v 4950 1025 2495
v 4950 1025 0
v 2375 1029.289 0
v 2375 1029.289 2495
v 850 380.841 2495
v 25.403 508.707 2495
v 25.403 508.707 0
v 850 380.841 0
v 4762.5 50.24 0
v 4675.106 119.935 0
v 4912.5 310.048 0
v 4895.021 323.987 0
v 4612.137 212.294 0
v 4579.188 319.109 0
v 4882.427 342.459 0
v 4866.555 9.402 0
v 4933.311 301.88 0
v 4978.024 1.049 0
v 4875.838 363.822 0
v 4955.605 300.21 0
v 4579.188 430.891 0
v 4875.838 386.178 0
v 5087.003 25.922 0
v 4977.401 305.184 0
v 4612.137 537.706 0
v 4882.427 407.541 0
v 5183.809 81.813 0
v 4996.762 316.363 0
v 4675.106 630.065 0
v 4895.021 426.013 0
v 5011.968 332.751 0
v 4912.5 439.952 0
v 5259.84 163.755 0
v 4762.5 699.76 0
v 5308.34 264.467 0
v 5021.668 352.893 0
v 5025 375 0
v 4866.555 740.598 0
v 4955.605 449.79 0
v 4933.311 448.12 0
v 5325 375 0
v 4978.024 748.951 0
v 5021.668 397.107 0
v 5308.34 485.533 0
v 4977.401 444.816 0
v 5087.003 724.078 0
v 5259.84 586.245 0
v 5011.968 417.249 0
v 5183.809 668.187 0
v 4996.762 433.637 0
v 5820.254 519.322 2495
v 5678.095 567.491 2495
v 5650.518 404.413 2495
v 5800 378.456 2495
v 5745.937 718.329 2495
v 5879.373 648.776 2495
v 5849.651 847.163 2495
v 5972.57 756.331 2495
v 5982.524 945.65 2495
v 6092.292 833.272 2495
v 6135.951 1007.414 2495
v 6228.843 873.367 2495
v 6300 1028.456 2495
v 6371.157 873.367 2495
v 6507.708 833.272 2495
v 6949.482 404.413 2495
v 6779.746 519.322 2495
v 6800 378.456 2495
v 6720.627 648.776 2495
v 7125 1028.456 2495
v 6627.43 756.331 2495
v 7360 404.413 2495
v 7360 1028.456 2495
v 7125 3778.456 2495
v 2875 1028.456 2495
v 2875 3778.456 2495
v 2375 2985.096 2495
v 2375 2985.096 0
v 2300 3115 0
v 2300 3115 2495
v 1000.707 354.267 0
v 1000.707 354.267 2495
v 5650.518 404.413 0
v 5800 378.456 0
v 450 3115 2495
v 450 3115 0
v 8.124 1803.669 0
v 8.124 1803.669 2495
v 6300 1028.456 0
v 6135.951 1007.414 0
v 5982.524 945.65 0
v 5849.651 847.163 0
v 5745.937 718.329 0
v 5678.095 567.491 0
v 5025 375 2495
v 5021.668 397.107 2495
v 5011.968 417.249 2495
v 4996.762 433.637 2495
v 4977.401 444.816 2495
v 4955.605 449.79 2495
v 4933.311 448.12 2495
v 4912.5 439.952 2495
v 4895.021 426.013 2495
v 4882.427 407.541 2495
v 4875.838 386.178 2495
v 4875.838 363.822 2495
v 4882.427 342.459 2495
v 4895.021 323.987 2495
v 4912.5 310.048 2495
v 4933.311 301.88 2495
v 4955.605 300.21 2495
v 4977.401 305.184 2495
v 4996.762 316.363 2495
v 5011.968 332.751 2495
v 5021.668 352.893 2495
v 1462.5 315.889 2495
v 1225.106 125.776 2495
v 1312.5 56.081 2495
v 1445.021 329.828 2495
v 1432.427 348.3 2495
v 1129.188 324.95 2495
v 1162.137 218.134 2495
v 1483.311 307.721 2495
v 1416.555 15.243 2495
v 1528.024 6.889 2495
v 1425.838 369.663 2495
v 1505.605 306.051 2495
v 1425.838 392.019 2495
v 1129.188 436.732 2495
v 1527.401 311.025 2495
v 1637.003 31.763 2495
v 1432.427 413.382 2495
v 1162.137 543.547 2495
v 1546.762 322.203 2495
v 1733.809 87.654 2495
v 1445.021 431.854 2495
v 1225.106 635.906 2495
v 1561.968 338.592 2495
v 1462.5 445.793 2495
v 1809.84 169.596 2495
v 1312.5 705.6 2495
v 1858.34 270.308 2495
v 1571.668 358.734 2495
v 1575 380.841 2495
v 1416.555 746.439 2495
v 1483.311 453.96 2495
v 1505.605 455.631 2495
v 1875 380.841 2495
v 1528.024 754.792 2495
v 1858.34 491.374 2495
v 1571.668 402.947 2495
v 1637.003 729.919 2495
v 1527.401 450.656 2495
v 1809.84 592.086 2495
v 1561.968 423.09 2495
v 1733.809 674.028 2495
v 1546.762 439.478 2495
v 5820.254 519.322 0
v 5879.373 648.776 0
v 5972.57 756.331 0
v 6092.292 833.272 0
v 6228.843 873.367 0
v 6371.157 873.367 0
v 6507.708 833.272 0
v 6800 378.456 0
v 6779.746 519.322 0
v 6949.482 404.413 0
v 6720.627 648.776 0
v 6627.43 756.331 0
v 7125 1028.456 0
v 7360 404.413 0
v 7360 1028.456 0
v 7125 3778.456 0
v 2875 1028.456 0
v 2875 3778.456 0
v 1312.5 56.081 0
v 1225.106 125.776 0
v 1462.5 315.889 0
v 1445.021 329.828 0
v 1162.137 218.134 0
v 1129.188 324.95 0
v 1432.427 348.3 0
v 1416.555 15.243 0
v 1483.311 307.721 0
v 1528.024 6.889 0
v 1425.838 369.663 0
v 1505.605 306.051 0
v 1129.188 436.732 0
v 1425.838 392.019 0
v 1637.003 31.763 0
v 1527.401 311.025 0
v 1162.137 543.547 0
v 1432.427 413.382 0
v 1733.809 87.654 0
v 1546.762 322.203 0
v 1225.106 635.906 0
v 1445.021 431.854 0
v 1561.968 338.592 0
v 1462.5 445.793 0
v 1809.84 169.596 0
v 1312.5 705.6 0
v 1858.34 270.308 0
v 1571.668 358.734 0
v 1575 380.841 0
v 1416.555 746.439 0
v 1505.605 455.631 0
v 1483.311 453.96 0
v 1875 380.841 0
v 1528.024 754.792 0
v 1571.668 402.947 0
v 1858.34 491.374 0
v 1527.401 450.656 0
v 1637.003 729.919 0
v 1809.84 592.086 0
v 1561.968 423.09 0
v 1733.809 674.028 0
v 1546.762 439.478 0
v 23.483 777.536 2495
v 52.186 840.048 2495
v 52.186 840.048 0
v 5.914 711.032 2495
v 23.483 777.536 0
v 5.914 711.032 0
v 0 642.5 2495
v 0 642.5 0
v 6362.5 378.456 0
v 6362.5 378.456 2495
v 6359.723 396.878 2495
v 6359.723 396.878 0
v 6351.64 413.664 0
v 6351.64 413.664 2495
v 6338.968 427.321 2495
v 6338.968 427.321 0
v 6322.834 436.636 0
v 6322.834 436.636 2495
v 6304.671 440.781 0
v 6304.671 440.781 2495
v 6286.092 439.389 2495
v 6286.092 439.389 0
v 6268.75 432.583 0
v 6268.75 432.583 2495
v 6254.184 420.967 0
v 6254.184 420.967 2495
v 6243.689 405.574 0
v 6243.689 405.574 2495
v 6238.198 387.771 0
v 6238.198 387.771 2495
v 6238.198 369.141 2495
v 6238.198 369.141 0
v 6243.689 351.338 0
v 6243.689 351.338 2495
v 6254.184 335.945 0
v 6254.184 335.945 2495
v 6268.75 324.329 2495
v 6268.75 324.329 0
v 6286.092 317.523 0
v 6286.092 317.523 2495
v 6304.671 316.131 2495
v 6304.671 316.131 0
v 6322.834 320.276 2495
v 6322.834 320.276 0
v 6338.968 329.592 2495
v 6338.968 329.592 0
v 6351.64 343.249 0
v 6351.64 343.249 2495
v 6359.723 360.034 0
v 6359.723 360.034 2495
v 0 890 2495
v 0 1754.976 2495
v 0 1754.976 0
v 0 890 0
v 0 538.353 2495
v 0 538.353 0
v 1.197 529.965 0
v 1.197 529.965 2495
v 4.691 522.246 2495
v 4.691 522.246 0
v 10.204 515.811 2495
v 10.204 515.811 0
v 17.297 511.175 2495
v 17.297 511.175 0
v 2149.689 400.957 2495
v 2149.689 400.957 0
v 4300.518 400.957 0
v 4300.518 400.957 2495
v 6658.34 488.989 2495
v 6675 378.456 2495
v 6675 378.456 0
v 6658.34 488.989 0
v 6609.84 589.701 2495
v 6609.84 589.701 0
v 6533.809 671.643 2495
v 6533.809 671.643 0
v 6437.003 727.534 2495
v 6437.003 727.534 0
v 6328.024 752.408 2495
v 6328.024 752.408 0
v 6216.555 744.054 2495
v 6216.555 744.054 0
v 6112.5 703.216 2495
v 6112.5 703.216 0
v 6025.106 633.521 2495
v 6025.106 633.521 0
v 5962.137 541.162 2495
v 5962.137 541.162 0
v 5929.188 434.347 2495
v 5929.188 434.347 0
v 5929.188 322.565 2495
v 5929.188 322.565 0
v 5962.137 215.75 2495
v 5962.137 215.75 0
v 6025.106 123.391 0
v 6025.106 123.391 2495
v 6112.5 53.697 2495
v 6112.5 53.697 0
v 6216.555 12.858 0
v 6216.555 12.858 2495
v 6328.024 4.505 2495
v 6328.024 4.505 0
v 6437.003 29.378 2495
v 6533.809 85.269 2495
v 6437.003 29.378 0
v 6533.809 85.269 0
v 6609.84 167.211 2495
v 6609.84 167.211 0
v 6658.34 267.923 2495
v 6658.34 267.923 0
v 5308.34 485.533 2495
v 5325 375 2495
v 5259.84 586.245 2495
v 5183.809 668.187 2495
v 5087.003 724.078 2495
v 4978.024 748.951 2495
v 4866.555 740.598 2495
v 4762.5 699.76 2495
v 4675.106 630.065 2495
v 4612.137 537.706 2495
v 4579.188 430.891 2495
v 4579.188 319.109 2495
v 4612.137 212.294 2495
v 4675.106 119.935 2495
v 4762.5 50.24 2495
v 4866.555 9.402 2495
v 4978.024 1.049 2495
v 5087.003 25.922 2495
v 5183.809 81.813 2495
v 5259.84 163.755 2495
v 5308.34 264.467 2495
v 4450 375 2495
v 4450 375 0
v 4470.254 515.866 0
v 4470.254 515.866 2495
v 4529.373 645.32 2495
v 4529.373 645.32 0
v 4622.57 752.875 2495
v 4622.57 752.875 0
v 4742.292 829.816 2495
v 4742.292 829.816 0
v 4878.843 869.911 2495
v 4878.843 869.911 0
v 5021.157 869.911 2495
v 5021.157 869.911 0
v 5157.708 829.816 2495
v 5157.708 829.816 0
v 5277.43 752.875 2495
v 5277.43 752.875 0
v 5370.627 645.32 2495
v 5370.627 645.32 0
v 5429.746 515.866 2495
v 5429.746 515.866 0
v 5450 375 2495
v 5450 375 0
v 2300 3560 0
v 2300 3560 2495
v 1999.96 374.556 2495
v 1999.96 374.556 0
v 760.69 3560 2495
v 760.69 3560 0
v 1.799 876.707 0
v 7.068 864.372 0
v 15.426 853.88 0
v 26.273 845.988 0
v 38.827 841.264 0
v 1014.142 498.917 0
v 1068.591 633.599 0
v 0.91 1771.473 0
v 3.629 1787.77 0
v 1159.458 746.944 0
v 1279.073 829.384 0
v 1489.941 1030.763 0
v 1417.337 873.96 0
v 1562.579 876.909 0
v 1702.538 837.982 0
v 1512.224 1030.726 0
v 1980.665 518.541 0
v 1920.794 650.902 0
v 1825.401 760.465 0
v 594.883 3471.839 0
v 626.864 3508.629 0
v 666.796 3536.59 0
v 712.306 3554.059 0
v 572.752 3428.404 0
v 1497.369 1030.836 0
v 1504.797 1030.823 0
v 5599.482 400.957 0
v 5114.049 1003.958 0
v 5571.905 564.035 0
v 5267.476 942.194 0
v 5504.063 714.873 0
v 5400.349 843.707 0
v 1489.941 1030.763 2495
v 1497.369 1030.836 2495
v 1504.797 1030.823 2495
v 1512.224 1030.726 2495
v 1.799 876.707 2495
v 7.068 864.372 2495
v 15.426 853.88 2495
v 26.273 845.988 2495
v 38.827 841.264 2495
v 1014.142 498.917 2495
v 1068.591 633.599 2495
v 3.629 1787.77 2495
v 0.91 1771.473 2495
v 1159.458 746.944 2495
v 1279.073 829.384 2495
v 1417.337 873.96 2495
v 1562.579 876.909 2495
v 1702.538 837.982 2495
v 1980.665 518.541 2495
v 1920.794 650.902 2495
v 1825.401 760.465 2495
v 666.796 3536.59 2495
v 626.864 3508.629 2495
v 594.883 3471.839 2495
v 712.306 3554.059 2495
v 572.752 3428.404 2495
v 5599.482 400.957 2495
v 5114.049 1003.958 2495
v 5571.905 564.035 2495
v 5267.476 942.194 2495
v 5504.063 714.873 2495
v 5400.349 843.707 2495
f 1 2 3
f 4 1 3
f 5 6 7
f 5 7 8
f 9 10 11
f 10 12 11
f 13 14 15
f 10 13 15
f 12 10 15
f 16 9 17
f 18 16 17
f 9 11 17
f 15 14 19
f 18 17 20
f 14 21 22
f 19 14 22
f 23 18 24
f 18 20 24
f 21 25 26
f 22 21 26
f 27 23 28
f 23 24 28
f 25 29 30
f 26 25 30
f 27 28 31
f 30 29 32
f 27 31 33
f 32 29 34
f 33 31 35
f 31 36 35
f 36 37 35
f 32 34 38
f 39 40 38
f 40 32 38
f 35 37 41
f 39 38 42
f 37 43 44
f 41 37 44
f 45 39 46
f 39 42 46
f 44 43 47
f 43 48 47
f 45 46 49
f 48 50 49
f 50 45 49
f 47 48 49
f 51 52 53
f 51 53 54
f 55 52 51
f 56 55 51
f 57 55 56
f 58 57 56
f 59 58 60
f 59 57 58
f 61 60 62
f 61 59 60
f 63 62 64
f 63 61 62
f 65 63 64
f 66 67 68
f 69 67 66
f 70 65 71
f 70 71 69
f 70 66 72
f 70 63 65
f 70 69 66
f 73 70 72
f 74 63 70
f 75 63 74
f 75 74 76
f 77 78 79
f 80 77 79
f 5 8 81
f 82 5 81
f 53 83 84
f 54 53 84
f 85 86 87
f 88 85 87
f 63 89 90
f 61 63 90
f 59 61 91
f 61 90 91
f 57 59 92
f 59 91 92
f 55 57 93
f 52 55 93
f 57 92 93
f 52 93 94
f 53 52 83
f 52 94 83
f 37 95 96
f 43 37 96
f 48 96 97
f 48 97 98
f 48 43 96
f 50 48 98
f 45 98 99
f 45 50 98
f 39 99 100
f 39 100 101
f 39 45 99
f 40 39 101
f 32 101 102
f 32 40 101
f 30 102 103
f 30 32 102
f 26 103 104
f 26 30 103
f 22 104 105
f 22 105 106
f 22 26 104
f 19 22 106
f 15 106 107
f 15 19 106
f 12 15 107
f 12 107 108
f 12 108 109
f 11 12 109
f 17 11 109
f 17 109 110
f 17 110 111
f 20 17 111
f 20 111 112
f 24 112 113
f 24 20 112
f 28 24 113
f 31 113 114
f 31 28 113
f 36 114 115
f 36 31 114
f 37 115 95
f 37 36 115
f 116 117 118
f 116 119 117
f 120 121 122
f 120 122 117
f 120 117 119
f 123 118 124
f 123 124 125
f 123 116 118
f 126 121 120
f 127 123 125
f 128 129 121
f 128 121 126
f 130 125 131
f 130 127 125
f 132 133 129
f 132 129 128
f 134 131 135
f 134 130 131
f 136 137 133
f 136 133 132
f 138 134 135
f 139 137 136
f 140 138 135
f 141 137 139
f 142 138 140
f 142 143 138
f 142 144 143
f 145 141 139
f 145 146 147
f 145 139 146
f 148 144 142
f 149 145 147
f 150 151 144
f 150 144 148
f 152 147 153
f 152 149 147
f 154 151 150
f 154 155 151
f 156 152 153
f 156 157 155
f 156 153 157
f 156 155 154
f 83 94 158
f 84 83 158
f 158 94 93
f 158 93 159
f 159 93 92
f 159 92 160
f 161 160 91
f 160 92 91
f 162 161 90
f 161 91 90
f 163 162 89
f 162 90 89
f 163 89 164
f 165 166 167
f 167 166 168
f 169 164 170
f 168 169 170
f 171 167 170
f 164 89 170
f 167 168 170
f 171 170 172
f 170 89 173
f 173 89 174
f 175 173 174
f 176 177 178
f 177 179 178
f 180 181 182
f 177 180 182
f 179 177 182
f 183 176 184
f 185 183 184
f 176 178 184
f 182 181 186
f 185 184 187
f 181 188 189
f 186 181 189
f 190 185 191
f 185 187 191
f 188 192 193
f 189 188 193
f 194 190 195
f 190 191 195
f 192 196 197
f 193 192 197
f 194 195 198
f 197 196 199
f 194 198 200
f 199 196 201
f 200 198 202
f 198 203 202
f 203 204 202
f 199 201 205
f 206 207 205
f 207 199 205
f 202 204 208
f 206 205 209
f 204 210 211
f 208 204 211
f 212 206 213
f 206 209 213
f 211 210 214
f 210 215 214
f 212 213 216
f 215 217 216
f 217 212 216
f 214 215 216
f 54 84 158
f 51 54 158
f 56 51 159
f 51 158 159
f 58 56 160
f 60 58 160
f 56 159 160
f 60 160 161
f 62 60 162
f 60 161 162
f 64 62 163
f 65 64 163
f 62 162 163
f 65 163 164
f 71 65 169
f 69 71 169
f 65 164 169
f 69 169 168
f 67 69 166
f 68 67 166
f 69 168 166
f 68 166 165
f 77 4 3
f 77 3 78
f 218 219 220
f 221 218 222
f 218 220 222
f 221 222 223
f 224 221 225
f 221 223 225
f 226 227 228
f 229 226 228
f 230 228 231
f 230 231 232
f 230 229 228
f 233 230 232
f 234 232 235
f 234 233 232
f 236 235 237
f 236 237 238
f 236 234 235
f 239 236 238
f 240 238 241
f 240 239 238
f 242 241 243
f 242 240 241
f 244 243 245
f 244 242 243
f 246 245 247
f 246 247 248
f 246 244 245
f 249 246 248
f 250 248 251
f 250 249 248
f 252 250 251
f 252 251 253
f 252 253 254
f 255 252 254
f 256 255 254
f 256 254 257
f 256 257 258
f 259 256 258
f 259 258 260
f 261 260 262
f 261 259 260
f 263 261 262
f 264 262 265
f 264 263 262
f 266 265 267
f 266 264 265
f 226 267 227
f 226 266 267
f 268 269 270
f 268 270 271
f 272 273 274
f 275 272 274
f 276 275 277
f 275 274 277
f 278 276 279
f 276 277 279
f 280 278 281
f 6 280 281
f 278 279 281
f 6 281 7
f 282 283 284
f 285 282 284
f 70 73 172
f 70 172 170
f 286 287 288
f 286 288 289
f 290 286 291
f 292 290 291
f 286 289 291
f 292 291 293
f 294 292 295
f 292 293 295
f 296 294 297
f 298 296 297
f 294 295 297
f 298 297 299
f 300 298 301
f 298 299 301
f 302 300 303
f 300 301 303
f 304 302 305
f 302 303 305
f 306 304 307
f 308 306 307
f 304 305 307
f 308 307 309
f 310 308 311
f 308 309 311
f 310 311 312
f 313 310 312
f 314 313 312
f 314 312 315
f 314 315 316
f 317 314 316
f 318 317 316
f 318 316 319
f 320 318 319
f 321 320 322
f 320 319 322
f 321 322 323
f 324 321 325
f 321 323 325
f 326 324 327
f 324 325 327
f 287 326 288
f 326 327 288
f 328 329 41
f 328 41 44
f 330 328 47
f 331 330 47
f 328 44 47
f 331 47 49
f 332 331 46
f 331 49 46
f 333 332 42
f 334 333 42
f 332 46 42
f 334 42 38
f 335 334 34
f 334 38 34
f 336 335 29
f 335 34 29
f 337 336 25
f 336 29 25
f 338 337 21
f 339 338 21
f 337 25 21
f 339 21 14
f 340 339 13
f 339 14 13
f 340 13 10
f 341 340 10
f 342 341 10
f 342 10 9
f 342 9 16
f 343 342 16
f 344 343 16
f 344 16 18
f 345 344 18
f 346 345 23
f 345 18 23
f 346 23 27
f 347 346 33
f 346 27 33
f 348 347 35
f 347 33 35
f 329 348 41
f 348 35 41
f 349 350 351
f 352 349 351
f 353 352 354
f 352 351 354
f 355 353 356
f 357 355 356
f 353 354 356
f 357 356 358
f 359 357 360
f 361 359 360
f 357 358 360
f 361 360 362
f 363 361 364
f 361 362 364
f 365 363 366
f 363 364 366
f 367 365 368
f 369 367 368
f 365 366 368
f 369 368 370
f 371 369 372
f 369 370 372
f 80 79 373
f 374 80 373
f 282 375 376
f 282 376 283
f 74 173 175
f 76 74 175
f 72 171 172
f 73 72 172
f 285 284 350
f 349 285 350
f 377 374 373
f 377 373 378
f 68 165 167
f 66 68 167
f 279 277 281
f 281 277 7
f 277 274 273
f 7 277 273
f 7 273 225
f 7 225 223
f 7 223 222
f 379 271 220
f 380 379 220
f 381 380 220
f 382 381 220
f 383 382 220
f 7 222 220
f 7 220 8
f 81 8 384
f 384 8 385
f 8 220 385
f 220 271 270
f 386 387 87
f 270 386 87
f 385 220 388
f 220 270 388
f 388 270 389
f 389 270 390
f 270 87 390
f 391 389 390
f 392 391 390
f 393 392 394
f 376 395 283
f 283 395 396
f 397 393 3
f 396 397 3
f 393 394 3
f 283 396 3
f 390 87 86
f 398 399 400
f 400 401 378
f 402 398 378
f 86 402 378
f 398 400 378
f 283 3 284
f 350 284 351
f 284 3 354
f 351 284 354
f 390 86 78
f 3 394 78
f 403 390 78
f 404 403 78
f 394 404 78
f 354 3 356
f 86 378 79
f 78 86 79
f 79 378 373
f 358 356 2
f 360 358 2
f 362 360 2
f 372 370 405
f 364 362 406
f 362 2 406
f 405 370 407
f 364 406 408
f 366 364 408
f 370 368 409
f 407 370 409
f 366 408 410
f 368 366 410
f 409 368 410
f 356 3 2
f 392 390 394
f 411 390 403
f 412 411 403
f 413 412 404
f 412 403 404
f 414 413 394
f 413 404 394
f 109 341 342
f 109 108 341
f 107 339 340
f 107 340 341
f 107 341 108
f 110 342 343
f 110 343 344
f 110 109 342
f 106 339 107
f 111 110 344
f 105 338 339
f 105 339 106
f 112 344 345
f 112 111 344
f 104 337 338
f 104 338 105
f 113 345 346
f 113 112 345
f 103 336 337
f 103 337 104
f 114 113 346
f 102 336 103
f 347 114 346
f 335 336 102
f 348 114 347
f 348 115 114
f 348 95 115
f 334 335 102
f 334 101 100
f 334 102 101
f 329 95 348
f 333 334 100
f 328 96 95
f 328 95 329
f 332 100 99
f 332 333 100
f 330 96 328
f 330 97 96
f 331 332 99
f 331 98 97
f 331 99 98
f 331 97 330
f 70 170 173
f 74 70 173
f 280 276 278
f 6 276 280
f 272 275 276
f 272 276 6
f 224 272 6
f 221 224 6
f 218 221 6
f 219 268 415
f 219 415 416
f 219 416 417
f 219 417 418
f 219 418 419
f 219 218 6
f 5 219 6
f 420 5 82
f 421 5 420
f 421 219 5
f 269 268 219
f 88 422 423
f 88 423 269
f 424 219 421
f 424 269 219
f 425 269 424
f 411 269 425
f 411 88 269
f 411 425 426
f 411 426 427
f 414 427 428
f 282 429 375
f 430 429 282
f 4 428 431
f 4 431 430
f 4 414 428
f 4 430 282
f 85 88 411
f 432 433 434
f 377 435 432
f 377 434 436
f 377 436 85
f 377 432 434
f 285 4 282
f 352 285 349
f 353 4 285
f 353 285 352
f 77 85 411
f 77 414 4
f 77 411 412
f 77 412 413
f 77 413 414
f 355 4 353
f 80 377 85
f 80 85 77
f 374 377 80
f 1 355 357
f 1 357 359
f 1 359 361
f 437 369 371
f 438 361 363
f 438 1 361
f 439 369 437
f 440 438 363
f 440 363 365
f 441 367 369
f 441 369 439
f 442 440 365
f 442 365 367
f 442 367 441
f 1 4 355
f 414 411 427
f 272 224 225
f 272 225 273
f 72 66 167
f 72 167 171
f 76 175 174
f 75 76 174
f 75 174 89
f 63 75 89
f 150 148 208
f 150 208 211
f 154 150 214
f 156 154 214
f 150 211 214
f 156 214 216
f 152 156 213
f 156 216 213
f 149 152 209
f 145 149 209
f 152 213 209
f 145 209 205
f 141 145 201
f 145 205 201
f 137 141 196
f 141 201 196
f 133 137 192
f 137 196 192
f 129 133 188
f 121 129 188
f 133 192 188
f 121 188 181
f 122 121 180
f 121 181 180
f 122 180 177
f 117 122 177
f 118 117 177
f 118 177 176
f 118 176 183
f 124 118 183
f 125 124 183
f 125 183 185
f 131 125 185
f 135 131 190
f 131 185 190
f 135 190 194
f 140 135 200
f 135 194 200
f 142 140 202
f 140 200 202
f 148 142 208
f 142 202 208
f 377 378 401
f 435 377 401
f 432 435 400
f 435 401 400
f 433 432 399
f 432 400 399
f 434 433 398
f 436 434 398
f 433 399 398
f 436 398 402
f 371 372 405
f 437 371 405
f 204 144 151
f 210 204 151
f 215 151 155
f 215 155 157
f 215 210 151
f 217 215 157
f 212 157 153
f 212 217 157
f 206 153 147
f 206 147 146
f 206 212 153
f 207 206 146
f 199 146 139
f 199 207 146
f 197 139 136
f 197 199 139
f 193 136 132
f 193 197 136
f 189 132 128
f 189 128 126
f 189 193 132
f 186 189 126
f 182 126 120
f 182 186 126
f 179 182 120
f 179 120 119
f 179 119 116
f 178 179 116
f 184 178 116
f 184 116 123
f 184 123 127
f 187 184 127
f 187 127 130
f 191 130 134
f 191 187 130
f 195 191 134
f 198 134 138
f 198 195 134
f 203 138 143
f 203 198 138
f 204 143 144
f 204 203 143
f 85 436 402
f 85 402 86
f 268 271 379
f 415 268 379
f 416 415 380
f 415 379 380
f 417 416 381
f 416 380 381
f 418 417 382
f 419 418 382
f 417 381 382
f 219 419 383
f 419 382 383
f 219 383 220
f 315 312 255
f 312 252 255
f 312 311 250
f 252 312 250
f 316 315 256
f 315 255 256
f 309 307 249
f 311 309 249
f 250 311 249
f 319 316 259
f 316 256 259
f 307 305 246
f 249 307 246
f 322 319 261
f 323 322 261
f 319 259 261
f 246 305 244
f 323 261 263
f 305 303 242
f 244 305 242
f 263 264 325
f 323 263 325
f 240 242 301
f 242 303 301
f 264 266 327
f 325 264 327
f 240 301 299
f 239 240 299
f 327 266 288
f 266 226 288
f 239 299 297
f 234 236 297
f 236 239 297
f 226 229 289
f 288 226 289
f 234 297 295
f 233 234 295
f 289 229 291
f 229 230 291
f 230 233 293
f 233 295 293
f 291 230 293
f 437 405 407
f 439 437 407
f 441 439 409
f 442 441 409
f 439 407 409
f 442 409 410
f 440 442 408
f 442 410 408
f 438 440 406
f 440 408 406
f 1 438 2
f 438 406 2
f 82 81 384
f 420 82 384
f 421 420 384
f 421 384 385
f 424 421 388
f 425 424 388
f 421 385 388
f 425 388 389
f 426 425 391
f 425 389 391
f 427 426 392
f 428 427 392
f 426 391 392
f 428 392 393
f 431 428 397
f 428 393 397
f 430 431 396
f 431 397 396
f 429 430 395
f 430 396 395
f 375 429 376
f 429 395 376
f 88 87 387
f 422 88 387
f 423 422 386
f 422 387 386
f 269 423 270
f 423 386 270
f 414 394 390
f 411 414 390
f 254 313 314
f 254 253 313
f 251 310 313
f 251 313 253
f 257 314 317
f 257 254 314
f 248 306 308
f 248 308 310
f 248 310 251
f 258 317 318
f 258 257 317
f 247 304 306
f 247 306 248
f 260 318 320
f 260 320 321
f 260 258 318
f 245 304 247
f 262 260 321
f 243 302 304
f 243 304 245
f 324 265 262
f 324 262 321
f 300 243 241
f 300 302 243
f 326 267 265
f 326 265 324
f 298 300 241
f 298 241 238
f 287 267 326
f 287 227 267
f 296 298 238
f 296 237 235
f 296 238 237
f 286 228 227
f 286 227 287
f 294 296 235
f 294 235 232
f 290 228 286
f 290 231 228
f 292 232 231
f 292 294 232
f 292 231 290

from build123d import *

# Parameters (mm, degrees)
BOSS_EXTRUDE1_DEPTH   = 2495
BOSS_EXTRUDE1_2_DEPTH = 2495
SKETCH1_R             = 375
SKETCH1_R_2           = 75
BOSS_EXTRUDE1_3_DEPTH = 2495
BOSS_EXTRUDE1_4_DEPTH = 2495
SKETCH1_R_3           = 62.5
BOSS_EXTRUDE1_5_DEPTH = 2495


with BuildPart() as part:
    # Sketch1 → Boss-Extrude1 (new body)
    with BuildSketch(Plane.XY):
        with BuildLine():
            Line((2875, 1028.456085172), (2375, 1029.28887678))
            Line((2375, 1029.28887678), (2375, 2985.096189432))
            Line((2375, 2985.096189432), (2300, 3115))
            Line((2300, 3115), (2300, 3560))
            Line((2300, 3560), (760.690046026, 3560))
            ThreePointArc((760.690046026, 3560), (645.974758755, 3523.830408858), (572.751521868, 3428.404028665))
            Line((572.751521868, 3428.404028665), (450, 3115))
            Line((450, 3115), (8.123515112, 1803.669160936))
            ThreePointArc((8.123515112, 1803.669160936), (2.044816358, 1779.658864628), (0, 1754.975598365))
            Line((0, 1754.975598365), (0, 890))
            ThreePointArc((0, 890), (15.425994412, 853.880225117), (52.185525503, 840.047788054))
            ThreePointArc((52.185525503, 840.047788054), (13.266377335, 744.66224526), (0, 642.500094242))
            Line((0, 642.500094242), (0, 538.353176878))
            ThreePointArc((0, 538.353176878), (7.219407149, 518.832813424), (25.402972623, 508.707480069))
            Line((25.402972623, 508.707480069), (850, 380.84085801))
            Line((850, 380.84085801), (1000.706658241, 354.26720799))
            ThreePointArc((1000.706658241, 354.26720799), (1489.850237153, 880.73782971), (1999.960496077, 374.555767537))
            Line((1999.960496077, 374.555767537), (2149.688652822, 400.956881343))
            Line((2149.688652822, 400.956881343), (4300.518483472, 400.956881343))
            Line((4300.518483472, 400.956881343), (4450, 375))
            ThreePointArc((4450, 375), (4950, 875), (5450, 375))
            Line((5450, 375), (5599.481516528, 400.956881343))
            ThreePointArc((5599.481516528, 400.956881343), (5400.348768804, 843.706716867), (4950, 1025))
            Line((4950, 1025), (2875, 1028.456085172))
        make_face()
        with BuildLine():
            Line((1512.224153378, 1030.725901748), (1489.940783681, 1030.763016555))
            ThreePointArc((1489.940783681, 1030.763016555), (1501.082627588, 1030.839956408), (1512.224153378, 1030.725901748))
        make_face(mode=Mode.SUBTRACT)
    extrude(amount=BOSS_EXTRUDE1_DEPTH)


with BuildPart() as body_2:
    # Sketch1 → Boss-Extrude1 2 (new body)
    with BuildSketch(Plane.XY):
        with BuildLine():
            Line((2875, 3778.456085172), (2875, 1028.456085172))
            Line((2875, 1028.456085172), (6300, 1028.456085172))
            ThreePointArc((6300, 1028.456085172), (5849.651231196, 847.162802039), (5650.518483472, 404.412966515))
            Line((5650.518483472, 404.412966515), (5800, 378.456085172))
            ThreePointArc((5800, 378.456085172), (6300, 878.456085172), (6800, 378.456085172))
            Line((6800, 378.456085172), (6949.481516528, 404.412966515))
            Line((6949.481516528, 404.412966515), (7360, 404.412966515))
            Line((7360, 404.412966515), (7360, 1028.456085172))
            Line((7360, 1028.456085172), (7125, 1028.456085172))
            Line((7125, 1028.456085172), (7125, 3778.456085172))
            Line((7125, 3778.456085172), (2875, 3778.456085172))
        make_face()
    extrude(amount=BOSS_EXTRUDE1_2_DEPTH)


with BuildPart() as body_3:
    # Sketch1 → Boss-Extrude1 3 (new body)
    with BuildSketch(Plane.XY):
        with Locations((1500, 380.84085801)):
            Circle(SKETCH1_R)
        with Locations((1500, 380.84085801)):
            Circle(SKETCH1_R_2, mode=Mode.SUBTRACT)
    extrude(amount=BOSS_EXTRUDE1_3_DEPTH)


with BuildPart() as body_4:
    # Sketch1 → Boss-Extrude1 4 (new body)
    with BuildSketch(Plane.XY):
        with Locations((4950, 375)):
            Circle(SKETCH1_R)
        with Locations((4950, 375)):
            Circle(SKETCH1_R_2, mode=Mode.SUBTRACT)
    extrude(amount=BOSS_EXTRUDE1_4_DEPTH)


with BuildPart() as body_5:
    # Sketch1 → Boss-Extrude1 5 (new body)
    with BuildSketch(Plane.XY):
        with Locations((6300, 378.456085172)):
            Circle(SKETCH1_R)
        with Locations((6300, 378.456085172)):
            Circle(SKETCH1_R_3, mode=Mode.SUBTRACT)
    extrude(amount=BOSS_EXTRUDE1_5_DEPTH)


solid = Compound([part.part, body_2.part, body_3.part, body_4.part, body_5.part])
